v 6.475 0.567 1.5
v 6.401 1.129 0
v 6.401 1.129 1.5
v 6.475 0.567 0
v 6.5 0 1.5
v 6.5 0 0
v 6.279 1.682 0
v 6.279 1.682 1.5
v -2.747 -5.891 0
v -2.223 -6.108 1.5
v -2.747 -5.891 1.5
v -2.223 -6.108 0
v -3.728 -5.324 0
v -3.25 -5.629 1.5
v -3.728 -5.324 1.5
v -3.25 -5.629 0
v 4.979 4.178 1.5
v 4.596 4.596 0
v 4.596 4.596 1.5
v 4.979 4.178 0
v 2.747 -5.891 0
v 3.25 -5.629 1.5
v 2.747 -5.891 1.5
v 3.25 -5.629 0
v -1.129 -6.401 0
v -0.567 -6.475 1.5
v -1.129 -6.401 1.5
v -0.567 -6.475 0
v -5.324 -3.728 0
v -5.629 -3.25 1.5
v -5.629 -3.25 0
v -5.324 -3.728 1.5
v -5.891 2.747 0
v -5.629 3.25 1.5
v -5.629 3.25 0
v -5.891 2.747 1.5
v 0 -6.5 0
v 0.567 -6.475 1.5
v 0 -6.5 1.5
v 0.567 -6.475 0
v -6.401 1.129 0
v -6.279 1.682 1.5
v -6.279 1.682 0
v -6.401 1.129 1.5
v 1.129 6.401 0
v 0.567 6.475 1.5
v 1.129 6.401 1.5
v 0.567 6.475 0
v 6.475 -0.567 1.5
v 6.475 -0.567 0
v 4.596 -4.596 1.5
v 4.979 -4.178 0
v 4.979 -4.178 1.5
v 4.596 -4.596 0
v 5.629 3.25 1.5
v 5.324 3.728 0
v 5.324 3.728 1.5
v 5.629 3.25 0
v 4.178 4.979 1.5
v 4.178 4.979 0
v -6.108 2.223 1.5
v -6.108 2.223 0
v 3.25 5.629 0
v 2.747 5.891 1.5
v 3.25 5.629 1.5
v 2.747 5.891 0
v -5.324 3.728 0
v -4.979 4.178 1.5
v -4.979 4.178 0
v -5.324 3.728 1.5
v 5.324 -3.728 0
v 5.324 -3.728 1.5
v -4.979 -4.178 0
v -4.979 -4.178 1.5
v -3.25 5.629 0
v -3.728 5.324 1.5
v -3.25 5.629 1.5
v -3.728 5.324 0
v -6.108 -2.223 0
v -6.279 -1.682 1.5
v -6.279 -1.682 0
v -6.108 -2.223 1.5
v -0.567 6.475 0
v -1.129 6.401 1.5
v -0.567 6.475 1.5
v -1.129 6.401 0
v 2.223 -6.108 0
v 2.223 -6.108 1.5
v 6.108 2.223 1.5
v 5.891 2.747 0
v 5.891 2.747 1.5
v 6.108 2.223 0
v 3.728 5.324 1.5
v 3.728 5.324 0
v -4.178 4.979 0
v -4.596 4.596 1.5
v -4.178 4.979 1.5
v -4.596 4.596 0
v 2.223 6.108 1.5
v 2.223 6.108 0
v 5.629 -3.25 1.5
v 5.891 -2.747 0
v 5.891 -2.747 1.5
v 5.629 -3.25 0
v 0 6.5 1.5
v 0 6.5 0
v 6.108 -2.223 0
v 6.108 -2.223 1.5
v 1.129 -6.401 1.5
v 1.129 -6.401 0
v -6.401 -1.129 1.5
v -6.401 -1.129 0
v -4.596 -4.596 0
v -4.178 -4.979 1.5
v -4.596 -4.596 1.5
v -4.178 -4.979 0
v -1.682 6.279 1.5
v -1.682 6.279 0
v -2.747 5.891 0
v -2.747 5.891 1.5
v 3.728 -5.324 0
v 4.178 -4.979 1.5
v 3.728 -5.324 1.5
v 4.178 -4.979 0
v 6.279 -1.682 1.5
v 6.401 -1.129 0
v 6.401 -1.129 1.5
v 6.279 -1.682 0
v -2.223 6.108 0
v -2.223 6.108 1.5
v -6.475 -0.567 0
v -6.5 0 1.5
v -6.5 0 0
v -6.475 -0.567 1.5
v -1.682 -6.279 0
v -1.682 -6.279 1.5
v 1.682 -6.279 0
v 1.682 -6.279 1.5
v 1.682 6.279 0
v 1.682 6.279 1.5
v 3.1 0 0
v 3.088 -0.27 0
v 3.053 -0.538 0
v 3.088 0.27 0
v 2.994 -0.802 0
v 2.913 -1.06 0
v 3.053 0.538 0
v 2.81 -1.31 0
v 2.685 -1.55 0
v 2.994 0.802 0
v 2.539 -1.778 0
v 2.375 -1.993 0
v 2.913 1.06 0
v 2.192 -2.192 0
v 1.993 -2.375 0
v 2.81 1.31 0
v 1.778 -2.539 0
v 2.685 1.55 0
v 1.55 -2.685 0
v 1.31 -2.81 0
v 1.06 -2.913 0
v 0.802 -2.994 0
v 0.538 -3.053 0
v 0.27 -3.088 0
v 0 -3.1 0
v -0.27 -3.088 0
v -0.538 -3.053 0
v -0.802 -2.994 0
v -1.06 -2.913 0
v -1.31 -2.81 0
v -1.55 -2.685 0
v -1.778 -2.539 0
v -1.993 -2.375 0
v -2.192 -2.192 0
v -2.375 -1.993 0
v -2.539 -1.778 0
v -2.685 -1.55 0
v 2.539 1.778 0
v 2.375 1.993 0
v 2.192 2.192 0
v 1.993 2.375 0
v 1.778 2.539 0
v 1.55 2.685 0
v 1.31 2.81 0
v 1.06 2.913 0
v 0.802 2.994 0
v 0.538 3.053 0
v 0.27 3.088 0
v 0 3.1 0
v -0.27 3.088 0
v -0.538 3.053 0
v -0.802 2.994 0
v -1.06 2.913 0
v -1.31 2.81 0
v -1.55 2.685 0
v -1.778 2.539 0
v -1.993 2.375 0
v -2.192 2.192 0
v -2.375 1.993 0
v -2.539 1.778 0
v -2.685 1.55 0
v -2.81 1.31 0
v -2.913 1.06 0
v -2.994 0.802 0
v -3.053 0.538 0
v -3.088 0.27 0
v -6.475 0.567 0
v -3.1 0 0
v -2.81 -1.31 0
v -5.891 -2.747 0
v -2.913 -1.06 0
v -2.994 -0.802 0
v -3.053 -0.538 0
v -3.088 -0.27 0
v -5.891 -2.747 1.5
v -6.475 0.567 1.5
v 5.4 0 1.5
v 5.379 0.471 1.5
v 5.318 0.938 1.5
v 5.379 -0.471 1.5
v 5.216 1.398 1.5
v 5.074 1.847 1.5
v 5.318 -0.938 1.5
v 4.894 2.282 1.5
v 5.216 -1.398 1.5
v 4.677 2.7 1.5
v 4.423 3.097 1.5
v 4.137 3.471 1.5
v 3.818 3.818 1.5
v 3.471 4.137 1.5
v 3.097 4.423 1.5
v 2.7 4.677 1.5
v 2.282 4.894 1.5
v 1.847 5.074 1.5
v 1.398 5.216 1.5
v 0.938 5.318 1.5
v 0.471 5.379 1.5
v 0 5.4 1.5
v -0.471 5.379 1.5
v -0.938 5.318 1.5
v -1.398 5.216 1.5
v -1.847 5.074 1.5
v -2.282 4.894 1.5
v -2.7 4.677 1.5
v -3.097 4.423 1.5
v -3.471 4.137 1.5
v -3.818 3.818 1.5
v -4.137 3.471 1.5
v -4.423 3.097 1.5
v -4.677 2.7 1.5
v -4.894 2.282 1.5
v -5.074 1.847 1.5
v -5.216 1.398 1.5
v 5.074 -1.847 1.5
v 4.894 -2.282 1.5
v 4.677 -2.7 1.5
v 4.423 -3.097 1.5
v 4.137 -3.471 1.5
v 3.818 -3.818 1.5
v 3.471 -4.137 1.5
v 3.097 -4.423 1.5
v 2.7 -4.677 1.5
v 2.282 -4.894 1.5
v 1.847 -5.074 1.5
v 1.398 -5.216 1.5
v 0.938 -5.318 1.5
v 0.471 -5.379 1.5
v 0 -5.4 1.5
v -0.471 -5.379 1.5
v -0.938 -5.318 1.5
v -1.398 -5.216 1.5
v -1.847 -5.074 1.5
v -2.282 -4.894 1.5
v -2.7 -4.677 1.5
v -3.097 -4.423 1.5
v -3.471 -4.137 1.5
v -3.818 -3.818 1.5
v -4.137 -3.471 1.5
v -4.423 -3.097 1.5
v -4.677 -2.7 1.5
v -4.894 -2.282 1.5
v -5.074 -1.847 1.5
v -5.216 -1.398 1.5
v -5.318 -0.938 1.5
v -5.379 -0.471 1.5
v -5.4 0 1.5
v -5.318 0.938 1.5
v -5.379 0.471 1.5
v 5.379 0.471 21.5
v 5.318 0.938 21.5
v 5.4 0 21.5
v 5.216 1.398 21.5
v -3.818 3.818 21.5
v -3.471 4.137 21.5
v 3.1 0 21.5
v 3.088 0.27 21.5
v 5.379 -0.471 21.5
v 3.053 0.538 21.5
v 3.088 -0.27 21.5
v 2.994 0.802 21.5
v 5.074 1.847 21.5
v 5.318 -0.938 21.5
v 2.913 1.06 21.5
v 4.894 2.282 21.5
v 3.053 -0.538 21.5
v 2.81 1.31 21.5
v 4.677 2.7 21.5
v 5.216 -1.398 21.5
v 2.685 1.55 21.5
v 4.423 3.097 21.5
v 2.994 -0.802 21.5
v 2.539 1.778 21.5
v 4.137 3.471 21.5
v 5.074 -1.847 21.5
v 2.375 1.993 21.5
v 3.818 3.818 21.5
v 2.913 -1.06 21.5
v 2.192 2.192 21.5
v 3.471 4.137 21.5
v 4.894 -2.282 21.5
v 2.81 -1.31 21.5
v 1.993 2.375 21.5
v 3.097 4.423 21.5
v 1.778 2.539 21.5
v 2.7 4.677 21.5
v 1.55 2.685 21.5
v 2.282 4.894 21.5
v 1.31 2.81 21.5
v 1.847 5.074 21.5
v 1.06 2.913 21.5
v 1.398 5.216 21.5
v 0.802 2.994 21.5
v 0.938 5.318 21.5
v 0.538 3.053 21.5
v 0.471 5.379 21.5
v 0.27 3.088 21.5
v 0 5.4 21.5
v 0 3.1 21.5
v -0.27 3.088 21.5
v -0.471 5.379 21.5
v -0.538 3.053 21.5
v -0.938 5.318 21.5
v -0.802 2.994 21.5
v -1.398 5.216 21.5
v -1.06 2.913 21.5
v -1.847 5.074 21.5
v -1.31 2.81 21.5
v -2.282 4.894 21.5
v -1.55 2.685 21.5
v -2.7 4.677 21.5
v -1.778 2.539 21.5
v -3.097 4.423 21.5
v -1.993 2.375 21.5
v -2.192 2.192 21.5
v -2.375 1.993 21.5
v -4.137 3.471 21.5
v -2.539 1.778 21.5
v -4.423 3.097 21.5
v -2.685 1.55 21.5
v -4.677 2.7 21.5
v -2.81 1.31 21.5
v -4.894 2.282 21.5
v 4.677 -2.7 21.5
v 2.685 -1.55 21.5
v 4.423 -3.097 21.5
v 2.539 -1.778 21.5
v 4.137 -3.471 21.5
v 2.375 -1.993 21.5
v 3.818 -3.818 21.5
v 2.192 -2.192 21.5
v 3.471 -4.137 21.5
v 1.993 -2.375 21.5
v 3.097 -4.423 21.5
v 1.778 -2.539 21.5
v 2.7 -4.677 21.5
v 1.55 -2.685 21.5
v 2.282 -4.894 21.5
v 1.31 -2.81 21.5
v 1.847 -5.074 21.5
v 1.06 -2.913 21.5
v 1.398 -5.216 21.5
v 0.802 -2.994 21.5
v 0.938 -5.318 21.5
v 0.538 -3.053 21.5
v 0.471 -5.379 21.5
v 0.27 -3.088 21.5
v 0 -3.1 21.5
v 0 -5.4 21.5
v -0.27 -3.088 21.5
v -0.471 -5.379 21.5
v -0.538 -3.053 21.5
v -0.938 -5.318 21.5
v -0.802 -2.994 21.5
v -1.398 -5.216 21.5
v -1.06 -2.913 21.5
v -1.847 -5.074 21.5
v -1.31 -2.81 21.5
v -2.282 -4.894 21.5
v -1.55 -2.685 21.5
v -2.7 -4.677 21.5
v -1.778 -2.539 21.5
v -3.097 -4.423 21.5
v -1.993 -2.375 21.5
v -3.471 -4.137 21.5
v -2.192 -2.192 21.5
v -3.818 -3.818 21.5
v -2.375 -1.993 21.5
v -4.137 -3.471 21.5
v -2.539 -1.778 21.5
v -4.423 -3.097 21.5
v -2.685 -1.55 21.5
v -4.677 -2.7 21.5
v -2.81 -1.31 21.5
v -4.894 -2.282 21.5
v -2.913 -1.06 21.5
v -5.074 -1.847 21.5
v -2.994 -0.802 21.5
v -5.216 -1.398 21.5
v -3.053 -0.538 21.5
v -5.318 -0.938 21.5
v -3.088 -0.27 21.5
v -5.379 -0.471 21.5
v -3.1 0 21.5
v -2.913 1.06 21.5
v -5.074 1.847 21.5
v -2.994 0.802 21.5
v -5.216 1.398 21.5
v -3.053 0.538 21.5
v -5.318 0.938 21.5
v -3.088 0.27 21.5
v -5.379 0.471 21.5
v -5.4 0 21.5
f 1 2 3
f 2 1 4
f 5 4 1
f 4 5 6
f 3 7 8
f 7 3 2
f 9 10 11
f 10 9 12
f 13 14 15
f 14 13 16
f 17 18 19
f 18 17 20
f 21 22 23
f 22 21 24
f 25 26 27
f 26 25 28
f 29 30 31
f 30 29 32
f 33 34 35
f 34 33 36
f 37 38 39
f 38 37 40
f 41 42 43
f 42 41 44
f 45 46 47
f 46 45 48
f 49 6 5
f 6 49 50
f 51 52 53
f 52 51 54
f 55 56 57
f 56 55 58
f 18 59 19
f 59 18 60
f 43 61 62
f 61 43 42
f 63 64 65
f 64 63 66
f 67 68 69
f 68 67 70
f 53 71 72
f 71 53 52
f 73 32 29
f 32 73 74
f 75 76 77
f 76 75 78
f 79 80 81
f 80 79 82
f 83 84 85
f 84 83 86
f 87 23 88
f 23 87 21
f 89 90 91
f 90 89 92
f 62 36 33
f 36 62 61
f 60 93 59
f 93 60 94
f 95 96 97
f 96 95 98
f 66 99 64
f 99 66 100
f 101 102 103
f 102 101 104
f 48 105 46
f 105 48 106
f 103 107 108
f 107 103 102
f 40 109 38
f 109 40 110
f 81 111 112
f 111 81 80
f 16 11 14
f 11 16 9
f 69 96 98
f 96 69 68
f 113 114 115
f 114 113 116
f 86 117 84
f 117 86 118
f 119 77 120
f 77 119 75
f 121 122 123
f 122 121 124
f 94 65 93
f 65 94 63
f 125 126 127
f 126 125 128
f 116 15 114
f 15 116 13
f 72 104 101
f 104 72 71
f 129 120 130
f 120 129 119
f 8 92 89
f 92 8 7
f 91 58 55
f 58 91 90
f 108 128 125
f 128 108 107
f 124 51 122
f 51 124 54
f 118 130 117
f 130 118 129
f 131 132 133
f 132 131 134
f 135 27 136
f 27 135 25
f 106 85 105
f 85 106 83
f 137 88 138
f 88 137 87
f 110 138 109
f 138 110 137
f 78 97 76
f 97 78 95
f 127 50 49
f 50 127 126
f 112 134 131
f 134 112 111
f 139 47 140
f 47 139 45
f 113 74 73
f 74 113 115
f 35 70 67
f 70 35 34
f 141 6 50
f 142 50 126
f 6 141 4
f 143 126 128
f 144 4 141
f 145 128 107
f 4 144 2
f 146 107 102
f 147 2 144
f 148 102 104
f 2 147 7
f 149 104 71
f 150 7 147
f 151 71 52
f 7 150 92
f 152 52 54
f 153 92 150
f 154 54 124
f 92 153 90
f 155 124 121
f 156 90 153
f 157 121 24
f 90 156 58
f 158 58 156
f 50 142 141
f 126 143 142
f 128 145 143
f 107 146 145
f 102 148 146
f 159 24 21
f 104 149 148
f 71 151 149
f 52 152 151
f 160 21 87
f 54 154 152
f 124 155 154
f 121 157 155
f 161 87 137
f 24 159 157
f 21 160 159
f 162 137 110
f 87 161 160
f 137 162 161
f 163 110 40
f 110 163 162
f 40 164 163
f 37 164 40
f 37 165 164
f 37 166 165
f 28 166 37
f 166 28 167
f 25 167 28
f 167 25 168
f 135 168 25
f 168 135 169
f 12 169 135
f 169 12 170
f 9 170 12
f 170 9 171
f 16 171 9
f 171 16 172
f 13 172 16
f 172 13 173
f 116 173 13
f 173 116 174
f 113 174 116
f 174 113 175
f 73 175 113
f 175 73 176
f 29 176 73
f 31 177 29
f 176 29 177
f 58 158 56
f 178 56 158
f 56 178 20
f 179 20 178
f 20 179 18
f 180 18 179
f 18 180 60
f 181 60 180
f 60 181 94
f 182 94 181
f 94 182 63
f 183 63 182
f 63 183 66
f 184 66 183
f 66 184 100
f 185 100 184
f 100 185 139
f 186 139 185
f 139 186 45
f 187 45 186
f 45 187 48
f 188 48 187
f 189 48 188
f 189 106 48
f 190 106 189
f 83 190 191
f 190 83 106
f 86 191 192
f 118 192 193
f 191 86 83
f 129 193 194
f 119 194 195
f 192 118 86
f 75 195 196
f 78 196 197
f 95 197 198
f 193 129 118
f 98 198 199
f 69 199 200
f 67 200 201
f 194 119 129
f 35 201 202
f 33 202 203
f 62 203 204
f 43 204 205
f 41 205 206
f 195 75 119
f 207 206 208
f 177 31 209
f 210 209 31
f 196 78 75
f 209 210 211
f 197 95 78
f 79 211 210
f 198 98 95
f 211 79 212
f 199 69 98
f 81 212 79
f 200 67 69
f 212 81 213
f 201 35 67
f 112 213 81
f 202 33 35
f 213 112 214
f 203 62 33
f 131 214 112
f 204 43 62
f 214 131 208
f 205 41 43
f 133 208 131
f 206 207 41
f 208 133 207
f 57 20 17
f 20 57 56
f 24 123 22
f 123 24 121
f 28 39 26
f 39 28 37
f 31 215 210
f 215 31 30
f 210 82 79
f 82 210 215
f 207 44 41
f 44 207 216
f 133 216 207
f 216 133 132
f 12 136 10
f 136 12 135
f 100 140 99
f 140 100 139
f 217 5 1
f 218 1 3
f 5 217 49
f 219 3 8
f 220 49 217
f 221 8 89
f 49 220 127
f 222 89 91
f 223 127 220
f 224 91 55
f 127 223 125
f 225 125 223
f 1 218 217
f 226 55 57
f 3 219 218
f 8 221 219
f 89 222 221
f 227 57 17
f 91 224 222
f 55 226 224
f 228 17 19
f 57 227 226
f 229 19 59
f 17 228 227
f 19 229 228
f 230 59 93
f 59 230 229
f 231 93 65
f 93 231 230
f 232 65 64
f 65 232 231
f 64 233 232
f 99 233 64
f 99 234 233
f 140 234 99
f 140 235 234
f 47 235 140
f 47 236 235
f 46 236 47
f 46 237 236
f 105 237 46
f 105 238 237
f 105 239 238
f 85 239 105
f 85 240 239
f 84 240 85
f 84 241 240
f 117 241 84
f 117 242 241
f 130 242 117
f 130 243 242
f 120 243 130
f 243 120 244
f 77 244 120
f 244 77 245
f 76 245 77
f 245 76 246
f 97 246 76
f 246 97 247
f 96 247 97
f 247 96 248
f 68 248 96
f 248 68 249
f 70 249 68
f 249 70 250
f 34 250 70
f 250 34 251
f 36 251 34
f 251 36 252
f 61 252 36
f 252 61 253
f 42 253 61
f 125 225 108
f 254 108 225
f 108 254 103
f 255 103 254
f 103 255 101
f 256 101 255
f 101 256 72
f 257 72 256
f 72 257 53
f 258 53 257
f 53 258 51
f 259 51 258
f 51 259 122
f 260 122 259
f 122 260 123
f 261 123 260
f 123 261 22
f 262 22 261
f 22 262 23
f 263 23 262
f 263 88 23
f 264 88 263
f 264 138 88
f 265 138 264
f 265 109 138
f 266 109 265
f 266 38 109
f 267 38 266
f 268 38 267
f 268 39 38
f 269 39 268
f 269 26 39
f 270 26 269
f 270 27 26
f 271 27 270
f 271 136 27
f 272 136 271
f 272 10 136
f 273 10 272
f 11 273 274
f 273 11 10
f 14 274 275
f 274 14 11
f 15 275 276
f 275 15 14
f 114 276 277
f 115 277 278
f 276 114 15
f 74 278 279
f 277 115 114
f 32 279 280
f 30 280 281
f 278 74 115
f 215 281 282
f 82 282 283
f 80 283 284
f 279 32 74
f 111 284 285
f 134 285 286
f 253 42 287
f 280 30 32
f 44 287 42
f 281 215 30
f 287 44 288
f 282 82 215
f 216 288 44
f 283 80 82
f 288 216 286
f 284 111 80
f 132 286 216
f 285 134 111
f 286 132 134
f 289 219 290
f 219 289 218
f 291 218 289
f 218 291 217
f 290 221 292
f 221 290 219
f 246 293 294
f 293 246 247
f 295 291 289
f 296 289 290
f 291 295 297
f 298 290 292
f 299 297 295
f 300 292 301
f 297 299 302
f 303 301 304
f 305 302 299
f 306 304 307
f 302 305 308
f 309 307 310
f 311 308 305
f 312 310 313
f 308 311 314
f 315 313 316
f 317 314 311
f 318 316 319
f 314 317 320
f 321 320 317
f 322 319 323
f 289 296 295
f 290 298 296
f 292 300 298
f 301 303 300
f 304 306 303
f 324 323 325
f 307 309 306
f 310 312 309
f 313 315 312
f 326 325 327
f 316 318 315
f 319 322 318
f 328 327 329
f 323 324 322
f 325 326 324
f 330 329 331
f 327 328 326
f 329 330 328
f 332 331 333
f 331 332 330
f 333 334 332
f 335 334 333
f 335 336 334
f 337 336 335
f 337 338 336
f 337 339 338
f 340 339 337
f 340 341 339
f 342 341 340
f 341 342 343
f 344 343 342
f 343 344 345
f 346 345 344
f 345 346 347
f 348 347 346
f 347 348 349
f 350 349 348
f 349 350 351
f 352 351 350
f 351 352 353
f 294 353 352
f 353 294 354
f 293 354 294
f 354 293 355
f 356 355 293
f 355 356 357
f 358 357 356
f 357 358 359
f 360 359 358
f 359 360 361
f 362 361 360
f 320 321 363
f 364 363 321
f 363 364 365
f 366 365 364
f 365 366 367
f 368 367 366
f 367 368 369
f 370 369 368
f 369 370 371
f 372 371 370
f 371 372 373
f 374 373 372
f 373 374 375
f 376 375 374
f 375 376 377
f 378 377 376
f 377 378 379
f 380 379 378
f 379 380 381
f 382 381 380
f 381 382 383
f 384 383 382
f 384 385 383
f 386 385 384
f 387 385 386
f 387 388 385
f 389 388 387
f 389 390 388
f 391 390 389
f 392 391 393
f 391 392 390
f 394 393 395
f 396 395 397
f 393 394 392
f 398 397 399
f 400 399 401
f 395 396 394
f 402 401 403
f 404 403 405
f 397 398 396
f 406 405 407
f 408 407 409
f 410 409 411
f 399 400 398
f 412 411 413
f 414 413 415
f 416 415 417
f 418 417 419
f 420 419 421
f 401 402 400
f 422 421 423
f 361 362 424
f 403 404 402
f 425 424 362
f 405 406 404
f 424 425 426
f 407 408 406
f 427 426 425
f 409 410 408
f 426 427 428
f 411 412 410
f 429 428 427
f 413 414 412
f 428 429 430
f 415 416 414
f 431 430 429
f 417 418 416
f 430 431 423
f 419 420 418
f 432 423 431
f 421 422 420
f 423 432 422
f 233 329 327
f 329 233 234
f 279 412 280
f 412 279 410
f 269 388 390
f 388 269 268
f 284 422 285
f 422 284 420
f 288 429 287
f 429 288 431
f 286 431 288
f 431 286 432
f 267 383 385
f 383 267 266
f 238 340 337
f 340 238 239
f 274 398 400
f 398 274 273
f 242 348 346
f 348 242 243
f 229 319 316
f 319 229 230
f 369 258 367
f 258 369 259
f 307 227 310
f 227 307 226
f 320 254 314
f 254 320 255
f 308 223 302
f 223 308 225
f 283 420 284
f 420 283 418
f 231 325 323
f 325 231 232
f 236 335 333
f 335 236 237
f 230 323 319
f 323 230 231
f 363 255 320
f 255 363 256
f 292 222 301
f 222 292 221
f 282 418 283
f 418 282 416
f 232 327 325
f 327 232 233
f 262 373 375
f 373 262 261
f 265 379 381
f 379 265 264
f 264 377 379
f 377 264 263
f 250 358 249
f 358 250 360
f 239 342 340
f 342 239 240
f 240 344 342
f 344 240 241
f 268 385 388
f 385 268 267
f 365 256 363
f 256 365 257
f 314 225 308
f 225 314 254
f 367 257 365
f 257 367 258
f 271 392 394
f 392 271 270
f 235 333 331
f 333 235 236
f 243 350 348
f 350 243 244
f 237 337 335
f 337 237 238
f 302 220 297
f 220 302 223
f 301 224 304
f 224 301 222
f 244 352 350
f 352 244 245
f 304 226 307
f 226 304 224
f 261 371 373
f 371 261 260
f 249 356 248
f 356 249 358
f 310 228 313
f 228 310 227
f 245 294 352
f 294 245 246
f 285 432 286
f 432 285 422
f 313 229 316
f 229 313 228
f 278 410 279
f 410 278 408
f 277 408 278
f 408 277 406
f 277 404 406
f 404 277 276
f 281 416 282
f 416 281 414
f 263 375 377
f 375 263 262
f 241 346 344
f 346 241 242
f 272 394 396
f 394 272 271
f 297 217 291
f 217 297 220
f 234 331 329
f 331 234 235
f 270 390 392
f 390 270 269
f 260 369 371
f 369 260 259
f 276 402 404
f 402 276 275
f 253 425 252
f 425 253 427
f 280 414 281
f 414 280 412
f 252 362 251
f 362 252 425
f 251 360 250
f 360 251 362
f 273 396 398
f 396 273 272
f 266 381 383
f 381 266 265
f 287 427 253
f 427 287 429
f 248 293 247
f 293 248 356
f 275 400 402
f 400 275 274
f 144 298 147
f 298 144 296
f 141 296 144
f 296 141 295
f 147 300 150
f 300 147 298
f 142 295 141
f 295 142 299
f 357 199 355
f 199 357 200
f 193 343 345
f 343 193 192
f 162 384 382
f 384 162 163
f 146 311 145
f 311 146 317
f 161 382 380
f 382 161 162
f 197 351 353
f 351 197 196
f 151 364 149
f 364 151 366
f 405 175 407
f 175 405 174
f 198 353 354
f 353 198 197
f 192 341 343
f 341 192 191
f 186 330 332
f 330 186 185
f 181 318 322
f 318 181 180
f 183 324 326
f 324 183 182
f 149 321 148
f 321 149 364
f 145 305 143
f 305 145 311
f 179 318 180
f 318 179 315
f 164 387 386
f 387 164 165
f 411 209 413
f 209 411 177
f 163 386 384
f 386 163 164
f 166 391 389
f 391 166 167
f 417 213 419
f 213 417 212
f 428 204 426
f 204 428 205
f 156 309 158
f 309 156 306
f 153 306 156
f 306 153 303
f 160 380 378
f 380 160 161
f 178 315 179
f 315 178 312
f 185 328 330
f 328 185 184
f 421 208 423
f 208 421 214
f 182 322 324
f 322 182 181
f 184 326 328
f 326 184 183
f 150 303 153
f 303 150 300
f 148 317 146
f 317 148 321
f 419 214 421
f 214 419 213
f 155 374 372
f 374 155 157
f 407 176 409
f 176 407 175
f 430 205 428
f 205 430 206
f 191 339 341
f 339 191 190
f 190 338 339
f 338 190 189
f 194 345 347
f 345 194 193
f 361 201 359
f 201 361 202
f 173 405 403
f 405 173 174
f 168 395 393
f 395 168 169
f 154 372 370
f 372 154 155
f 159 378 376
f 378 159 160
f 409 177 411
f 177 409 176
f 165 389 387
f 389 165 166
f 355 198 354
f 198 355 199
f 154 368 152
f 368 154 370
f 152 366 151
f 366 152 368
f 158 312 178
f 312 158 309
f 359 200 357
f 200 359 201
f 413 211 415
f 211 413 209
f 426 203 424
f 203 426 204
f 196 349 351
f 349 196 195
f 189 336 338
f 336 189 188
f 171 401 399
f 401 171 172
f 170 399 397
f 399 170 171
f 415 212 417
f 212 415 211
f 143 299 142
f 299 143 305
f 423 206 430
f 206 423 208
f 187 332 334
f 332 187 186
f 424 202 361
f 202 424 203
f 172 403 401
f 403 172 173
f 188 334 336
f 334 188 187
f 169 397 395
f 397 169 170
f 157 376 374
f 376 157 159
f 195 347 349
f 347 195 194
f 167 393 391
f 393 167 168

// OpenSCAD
// Adapter sleeve - a collar with a sleeve body that lines a 1.5 mL tube rack hole to hold a
// 0.2 mL PCR tube, with a through bore. NOVEL general part (a generic tube adapter).
//

top_d     = 13;
body_d    = 10.8;
collar_t  = 1.5;
body_h    = 21.5;
bore_d    = 6.2;

$fn = 72;

flange_t = 2;

difference() {
    union() {
        cylinder(h = collar_t, d = top_d);
        cylinder(h = body_h, d = body_d);
    }
    translate([0, 0, -1]) cylinder(h = collar_t + body_h + 2, d = bore_d);
}
